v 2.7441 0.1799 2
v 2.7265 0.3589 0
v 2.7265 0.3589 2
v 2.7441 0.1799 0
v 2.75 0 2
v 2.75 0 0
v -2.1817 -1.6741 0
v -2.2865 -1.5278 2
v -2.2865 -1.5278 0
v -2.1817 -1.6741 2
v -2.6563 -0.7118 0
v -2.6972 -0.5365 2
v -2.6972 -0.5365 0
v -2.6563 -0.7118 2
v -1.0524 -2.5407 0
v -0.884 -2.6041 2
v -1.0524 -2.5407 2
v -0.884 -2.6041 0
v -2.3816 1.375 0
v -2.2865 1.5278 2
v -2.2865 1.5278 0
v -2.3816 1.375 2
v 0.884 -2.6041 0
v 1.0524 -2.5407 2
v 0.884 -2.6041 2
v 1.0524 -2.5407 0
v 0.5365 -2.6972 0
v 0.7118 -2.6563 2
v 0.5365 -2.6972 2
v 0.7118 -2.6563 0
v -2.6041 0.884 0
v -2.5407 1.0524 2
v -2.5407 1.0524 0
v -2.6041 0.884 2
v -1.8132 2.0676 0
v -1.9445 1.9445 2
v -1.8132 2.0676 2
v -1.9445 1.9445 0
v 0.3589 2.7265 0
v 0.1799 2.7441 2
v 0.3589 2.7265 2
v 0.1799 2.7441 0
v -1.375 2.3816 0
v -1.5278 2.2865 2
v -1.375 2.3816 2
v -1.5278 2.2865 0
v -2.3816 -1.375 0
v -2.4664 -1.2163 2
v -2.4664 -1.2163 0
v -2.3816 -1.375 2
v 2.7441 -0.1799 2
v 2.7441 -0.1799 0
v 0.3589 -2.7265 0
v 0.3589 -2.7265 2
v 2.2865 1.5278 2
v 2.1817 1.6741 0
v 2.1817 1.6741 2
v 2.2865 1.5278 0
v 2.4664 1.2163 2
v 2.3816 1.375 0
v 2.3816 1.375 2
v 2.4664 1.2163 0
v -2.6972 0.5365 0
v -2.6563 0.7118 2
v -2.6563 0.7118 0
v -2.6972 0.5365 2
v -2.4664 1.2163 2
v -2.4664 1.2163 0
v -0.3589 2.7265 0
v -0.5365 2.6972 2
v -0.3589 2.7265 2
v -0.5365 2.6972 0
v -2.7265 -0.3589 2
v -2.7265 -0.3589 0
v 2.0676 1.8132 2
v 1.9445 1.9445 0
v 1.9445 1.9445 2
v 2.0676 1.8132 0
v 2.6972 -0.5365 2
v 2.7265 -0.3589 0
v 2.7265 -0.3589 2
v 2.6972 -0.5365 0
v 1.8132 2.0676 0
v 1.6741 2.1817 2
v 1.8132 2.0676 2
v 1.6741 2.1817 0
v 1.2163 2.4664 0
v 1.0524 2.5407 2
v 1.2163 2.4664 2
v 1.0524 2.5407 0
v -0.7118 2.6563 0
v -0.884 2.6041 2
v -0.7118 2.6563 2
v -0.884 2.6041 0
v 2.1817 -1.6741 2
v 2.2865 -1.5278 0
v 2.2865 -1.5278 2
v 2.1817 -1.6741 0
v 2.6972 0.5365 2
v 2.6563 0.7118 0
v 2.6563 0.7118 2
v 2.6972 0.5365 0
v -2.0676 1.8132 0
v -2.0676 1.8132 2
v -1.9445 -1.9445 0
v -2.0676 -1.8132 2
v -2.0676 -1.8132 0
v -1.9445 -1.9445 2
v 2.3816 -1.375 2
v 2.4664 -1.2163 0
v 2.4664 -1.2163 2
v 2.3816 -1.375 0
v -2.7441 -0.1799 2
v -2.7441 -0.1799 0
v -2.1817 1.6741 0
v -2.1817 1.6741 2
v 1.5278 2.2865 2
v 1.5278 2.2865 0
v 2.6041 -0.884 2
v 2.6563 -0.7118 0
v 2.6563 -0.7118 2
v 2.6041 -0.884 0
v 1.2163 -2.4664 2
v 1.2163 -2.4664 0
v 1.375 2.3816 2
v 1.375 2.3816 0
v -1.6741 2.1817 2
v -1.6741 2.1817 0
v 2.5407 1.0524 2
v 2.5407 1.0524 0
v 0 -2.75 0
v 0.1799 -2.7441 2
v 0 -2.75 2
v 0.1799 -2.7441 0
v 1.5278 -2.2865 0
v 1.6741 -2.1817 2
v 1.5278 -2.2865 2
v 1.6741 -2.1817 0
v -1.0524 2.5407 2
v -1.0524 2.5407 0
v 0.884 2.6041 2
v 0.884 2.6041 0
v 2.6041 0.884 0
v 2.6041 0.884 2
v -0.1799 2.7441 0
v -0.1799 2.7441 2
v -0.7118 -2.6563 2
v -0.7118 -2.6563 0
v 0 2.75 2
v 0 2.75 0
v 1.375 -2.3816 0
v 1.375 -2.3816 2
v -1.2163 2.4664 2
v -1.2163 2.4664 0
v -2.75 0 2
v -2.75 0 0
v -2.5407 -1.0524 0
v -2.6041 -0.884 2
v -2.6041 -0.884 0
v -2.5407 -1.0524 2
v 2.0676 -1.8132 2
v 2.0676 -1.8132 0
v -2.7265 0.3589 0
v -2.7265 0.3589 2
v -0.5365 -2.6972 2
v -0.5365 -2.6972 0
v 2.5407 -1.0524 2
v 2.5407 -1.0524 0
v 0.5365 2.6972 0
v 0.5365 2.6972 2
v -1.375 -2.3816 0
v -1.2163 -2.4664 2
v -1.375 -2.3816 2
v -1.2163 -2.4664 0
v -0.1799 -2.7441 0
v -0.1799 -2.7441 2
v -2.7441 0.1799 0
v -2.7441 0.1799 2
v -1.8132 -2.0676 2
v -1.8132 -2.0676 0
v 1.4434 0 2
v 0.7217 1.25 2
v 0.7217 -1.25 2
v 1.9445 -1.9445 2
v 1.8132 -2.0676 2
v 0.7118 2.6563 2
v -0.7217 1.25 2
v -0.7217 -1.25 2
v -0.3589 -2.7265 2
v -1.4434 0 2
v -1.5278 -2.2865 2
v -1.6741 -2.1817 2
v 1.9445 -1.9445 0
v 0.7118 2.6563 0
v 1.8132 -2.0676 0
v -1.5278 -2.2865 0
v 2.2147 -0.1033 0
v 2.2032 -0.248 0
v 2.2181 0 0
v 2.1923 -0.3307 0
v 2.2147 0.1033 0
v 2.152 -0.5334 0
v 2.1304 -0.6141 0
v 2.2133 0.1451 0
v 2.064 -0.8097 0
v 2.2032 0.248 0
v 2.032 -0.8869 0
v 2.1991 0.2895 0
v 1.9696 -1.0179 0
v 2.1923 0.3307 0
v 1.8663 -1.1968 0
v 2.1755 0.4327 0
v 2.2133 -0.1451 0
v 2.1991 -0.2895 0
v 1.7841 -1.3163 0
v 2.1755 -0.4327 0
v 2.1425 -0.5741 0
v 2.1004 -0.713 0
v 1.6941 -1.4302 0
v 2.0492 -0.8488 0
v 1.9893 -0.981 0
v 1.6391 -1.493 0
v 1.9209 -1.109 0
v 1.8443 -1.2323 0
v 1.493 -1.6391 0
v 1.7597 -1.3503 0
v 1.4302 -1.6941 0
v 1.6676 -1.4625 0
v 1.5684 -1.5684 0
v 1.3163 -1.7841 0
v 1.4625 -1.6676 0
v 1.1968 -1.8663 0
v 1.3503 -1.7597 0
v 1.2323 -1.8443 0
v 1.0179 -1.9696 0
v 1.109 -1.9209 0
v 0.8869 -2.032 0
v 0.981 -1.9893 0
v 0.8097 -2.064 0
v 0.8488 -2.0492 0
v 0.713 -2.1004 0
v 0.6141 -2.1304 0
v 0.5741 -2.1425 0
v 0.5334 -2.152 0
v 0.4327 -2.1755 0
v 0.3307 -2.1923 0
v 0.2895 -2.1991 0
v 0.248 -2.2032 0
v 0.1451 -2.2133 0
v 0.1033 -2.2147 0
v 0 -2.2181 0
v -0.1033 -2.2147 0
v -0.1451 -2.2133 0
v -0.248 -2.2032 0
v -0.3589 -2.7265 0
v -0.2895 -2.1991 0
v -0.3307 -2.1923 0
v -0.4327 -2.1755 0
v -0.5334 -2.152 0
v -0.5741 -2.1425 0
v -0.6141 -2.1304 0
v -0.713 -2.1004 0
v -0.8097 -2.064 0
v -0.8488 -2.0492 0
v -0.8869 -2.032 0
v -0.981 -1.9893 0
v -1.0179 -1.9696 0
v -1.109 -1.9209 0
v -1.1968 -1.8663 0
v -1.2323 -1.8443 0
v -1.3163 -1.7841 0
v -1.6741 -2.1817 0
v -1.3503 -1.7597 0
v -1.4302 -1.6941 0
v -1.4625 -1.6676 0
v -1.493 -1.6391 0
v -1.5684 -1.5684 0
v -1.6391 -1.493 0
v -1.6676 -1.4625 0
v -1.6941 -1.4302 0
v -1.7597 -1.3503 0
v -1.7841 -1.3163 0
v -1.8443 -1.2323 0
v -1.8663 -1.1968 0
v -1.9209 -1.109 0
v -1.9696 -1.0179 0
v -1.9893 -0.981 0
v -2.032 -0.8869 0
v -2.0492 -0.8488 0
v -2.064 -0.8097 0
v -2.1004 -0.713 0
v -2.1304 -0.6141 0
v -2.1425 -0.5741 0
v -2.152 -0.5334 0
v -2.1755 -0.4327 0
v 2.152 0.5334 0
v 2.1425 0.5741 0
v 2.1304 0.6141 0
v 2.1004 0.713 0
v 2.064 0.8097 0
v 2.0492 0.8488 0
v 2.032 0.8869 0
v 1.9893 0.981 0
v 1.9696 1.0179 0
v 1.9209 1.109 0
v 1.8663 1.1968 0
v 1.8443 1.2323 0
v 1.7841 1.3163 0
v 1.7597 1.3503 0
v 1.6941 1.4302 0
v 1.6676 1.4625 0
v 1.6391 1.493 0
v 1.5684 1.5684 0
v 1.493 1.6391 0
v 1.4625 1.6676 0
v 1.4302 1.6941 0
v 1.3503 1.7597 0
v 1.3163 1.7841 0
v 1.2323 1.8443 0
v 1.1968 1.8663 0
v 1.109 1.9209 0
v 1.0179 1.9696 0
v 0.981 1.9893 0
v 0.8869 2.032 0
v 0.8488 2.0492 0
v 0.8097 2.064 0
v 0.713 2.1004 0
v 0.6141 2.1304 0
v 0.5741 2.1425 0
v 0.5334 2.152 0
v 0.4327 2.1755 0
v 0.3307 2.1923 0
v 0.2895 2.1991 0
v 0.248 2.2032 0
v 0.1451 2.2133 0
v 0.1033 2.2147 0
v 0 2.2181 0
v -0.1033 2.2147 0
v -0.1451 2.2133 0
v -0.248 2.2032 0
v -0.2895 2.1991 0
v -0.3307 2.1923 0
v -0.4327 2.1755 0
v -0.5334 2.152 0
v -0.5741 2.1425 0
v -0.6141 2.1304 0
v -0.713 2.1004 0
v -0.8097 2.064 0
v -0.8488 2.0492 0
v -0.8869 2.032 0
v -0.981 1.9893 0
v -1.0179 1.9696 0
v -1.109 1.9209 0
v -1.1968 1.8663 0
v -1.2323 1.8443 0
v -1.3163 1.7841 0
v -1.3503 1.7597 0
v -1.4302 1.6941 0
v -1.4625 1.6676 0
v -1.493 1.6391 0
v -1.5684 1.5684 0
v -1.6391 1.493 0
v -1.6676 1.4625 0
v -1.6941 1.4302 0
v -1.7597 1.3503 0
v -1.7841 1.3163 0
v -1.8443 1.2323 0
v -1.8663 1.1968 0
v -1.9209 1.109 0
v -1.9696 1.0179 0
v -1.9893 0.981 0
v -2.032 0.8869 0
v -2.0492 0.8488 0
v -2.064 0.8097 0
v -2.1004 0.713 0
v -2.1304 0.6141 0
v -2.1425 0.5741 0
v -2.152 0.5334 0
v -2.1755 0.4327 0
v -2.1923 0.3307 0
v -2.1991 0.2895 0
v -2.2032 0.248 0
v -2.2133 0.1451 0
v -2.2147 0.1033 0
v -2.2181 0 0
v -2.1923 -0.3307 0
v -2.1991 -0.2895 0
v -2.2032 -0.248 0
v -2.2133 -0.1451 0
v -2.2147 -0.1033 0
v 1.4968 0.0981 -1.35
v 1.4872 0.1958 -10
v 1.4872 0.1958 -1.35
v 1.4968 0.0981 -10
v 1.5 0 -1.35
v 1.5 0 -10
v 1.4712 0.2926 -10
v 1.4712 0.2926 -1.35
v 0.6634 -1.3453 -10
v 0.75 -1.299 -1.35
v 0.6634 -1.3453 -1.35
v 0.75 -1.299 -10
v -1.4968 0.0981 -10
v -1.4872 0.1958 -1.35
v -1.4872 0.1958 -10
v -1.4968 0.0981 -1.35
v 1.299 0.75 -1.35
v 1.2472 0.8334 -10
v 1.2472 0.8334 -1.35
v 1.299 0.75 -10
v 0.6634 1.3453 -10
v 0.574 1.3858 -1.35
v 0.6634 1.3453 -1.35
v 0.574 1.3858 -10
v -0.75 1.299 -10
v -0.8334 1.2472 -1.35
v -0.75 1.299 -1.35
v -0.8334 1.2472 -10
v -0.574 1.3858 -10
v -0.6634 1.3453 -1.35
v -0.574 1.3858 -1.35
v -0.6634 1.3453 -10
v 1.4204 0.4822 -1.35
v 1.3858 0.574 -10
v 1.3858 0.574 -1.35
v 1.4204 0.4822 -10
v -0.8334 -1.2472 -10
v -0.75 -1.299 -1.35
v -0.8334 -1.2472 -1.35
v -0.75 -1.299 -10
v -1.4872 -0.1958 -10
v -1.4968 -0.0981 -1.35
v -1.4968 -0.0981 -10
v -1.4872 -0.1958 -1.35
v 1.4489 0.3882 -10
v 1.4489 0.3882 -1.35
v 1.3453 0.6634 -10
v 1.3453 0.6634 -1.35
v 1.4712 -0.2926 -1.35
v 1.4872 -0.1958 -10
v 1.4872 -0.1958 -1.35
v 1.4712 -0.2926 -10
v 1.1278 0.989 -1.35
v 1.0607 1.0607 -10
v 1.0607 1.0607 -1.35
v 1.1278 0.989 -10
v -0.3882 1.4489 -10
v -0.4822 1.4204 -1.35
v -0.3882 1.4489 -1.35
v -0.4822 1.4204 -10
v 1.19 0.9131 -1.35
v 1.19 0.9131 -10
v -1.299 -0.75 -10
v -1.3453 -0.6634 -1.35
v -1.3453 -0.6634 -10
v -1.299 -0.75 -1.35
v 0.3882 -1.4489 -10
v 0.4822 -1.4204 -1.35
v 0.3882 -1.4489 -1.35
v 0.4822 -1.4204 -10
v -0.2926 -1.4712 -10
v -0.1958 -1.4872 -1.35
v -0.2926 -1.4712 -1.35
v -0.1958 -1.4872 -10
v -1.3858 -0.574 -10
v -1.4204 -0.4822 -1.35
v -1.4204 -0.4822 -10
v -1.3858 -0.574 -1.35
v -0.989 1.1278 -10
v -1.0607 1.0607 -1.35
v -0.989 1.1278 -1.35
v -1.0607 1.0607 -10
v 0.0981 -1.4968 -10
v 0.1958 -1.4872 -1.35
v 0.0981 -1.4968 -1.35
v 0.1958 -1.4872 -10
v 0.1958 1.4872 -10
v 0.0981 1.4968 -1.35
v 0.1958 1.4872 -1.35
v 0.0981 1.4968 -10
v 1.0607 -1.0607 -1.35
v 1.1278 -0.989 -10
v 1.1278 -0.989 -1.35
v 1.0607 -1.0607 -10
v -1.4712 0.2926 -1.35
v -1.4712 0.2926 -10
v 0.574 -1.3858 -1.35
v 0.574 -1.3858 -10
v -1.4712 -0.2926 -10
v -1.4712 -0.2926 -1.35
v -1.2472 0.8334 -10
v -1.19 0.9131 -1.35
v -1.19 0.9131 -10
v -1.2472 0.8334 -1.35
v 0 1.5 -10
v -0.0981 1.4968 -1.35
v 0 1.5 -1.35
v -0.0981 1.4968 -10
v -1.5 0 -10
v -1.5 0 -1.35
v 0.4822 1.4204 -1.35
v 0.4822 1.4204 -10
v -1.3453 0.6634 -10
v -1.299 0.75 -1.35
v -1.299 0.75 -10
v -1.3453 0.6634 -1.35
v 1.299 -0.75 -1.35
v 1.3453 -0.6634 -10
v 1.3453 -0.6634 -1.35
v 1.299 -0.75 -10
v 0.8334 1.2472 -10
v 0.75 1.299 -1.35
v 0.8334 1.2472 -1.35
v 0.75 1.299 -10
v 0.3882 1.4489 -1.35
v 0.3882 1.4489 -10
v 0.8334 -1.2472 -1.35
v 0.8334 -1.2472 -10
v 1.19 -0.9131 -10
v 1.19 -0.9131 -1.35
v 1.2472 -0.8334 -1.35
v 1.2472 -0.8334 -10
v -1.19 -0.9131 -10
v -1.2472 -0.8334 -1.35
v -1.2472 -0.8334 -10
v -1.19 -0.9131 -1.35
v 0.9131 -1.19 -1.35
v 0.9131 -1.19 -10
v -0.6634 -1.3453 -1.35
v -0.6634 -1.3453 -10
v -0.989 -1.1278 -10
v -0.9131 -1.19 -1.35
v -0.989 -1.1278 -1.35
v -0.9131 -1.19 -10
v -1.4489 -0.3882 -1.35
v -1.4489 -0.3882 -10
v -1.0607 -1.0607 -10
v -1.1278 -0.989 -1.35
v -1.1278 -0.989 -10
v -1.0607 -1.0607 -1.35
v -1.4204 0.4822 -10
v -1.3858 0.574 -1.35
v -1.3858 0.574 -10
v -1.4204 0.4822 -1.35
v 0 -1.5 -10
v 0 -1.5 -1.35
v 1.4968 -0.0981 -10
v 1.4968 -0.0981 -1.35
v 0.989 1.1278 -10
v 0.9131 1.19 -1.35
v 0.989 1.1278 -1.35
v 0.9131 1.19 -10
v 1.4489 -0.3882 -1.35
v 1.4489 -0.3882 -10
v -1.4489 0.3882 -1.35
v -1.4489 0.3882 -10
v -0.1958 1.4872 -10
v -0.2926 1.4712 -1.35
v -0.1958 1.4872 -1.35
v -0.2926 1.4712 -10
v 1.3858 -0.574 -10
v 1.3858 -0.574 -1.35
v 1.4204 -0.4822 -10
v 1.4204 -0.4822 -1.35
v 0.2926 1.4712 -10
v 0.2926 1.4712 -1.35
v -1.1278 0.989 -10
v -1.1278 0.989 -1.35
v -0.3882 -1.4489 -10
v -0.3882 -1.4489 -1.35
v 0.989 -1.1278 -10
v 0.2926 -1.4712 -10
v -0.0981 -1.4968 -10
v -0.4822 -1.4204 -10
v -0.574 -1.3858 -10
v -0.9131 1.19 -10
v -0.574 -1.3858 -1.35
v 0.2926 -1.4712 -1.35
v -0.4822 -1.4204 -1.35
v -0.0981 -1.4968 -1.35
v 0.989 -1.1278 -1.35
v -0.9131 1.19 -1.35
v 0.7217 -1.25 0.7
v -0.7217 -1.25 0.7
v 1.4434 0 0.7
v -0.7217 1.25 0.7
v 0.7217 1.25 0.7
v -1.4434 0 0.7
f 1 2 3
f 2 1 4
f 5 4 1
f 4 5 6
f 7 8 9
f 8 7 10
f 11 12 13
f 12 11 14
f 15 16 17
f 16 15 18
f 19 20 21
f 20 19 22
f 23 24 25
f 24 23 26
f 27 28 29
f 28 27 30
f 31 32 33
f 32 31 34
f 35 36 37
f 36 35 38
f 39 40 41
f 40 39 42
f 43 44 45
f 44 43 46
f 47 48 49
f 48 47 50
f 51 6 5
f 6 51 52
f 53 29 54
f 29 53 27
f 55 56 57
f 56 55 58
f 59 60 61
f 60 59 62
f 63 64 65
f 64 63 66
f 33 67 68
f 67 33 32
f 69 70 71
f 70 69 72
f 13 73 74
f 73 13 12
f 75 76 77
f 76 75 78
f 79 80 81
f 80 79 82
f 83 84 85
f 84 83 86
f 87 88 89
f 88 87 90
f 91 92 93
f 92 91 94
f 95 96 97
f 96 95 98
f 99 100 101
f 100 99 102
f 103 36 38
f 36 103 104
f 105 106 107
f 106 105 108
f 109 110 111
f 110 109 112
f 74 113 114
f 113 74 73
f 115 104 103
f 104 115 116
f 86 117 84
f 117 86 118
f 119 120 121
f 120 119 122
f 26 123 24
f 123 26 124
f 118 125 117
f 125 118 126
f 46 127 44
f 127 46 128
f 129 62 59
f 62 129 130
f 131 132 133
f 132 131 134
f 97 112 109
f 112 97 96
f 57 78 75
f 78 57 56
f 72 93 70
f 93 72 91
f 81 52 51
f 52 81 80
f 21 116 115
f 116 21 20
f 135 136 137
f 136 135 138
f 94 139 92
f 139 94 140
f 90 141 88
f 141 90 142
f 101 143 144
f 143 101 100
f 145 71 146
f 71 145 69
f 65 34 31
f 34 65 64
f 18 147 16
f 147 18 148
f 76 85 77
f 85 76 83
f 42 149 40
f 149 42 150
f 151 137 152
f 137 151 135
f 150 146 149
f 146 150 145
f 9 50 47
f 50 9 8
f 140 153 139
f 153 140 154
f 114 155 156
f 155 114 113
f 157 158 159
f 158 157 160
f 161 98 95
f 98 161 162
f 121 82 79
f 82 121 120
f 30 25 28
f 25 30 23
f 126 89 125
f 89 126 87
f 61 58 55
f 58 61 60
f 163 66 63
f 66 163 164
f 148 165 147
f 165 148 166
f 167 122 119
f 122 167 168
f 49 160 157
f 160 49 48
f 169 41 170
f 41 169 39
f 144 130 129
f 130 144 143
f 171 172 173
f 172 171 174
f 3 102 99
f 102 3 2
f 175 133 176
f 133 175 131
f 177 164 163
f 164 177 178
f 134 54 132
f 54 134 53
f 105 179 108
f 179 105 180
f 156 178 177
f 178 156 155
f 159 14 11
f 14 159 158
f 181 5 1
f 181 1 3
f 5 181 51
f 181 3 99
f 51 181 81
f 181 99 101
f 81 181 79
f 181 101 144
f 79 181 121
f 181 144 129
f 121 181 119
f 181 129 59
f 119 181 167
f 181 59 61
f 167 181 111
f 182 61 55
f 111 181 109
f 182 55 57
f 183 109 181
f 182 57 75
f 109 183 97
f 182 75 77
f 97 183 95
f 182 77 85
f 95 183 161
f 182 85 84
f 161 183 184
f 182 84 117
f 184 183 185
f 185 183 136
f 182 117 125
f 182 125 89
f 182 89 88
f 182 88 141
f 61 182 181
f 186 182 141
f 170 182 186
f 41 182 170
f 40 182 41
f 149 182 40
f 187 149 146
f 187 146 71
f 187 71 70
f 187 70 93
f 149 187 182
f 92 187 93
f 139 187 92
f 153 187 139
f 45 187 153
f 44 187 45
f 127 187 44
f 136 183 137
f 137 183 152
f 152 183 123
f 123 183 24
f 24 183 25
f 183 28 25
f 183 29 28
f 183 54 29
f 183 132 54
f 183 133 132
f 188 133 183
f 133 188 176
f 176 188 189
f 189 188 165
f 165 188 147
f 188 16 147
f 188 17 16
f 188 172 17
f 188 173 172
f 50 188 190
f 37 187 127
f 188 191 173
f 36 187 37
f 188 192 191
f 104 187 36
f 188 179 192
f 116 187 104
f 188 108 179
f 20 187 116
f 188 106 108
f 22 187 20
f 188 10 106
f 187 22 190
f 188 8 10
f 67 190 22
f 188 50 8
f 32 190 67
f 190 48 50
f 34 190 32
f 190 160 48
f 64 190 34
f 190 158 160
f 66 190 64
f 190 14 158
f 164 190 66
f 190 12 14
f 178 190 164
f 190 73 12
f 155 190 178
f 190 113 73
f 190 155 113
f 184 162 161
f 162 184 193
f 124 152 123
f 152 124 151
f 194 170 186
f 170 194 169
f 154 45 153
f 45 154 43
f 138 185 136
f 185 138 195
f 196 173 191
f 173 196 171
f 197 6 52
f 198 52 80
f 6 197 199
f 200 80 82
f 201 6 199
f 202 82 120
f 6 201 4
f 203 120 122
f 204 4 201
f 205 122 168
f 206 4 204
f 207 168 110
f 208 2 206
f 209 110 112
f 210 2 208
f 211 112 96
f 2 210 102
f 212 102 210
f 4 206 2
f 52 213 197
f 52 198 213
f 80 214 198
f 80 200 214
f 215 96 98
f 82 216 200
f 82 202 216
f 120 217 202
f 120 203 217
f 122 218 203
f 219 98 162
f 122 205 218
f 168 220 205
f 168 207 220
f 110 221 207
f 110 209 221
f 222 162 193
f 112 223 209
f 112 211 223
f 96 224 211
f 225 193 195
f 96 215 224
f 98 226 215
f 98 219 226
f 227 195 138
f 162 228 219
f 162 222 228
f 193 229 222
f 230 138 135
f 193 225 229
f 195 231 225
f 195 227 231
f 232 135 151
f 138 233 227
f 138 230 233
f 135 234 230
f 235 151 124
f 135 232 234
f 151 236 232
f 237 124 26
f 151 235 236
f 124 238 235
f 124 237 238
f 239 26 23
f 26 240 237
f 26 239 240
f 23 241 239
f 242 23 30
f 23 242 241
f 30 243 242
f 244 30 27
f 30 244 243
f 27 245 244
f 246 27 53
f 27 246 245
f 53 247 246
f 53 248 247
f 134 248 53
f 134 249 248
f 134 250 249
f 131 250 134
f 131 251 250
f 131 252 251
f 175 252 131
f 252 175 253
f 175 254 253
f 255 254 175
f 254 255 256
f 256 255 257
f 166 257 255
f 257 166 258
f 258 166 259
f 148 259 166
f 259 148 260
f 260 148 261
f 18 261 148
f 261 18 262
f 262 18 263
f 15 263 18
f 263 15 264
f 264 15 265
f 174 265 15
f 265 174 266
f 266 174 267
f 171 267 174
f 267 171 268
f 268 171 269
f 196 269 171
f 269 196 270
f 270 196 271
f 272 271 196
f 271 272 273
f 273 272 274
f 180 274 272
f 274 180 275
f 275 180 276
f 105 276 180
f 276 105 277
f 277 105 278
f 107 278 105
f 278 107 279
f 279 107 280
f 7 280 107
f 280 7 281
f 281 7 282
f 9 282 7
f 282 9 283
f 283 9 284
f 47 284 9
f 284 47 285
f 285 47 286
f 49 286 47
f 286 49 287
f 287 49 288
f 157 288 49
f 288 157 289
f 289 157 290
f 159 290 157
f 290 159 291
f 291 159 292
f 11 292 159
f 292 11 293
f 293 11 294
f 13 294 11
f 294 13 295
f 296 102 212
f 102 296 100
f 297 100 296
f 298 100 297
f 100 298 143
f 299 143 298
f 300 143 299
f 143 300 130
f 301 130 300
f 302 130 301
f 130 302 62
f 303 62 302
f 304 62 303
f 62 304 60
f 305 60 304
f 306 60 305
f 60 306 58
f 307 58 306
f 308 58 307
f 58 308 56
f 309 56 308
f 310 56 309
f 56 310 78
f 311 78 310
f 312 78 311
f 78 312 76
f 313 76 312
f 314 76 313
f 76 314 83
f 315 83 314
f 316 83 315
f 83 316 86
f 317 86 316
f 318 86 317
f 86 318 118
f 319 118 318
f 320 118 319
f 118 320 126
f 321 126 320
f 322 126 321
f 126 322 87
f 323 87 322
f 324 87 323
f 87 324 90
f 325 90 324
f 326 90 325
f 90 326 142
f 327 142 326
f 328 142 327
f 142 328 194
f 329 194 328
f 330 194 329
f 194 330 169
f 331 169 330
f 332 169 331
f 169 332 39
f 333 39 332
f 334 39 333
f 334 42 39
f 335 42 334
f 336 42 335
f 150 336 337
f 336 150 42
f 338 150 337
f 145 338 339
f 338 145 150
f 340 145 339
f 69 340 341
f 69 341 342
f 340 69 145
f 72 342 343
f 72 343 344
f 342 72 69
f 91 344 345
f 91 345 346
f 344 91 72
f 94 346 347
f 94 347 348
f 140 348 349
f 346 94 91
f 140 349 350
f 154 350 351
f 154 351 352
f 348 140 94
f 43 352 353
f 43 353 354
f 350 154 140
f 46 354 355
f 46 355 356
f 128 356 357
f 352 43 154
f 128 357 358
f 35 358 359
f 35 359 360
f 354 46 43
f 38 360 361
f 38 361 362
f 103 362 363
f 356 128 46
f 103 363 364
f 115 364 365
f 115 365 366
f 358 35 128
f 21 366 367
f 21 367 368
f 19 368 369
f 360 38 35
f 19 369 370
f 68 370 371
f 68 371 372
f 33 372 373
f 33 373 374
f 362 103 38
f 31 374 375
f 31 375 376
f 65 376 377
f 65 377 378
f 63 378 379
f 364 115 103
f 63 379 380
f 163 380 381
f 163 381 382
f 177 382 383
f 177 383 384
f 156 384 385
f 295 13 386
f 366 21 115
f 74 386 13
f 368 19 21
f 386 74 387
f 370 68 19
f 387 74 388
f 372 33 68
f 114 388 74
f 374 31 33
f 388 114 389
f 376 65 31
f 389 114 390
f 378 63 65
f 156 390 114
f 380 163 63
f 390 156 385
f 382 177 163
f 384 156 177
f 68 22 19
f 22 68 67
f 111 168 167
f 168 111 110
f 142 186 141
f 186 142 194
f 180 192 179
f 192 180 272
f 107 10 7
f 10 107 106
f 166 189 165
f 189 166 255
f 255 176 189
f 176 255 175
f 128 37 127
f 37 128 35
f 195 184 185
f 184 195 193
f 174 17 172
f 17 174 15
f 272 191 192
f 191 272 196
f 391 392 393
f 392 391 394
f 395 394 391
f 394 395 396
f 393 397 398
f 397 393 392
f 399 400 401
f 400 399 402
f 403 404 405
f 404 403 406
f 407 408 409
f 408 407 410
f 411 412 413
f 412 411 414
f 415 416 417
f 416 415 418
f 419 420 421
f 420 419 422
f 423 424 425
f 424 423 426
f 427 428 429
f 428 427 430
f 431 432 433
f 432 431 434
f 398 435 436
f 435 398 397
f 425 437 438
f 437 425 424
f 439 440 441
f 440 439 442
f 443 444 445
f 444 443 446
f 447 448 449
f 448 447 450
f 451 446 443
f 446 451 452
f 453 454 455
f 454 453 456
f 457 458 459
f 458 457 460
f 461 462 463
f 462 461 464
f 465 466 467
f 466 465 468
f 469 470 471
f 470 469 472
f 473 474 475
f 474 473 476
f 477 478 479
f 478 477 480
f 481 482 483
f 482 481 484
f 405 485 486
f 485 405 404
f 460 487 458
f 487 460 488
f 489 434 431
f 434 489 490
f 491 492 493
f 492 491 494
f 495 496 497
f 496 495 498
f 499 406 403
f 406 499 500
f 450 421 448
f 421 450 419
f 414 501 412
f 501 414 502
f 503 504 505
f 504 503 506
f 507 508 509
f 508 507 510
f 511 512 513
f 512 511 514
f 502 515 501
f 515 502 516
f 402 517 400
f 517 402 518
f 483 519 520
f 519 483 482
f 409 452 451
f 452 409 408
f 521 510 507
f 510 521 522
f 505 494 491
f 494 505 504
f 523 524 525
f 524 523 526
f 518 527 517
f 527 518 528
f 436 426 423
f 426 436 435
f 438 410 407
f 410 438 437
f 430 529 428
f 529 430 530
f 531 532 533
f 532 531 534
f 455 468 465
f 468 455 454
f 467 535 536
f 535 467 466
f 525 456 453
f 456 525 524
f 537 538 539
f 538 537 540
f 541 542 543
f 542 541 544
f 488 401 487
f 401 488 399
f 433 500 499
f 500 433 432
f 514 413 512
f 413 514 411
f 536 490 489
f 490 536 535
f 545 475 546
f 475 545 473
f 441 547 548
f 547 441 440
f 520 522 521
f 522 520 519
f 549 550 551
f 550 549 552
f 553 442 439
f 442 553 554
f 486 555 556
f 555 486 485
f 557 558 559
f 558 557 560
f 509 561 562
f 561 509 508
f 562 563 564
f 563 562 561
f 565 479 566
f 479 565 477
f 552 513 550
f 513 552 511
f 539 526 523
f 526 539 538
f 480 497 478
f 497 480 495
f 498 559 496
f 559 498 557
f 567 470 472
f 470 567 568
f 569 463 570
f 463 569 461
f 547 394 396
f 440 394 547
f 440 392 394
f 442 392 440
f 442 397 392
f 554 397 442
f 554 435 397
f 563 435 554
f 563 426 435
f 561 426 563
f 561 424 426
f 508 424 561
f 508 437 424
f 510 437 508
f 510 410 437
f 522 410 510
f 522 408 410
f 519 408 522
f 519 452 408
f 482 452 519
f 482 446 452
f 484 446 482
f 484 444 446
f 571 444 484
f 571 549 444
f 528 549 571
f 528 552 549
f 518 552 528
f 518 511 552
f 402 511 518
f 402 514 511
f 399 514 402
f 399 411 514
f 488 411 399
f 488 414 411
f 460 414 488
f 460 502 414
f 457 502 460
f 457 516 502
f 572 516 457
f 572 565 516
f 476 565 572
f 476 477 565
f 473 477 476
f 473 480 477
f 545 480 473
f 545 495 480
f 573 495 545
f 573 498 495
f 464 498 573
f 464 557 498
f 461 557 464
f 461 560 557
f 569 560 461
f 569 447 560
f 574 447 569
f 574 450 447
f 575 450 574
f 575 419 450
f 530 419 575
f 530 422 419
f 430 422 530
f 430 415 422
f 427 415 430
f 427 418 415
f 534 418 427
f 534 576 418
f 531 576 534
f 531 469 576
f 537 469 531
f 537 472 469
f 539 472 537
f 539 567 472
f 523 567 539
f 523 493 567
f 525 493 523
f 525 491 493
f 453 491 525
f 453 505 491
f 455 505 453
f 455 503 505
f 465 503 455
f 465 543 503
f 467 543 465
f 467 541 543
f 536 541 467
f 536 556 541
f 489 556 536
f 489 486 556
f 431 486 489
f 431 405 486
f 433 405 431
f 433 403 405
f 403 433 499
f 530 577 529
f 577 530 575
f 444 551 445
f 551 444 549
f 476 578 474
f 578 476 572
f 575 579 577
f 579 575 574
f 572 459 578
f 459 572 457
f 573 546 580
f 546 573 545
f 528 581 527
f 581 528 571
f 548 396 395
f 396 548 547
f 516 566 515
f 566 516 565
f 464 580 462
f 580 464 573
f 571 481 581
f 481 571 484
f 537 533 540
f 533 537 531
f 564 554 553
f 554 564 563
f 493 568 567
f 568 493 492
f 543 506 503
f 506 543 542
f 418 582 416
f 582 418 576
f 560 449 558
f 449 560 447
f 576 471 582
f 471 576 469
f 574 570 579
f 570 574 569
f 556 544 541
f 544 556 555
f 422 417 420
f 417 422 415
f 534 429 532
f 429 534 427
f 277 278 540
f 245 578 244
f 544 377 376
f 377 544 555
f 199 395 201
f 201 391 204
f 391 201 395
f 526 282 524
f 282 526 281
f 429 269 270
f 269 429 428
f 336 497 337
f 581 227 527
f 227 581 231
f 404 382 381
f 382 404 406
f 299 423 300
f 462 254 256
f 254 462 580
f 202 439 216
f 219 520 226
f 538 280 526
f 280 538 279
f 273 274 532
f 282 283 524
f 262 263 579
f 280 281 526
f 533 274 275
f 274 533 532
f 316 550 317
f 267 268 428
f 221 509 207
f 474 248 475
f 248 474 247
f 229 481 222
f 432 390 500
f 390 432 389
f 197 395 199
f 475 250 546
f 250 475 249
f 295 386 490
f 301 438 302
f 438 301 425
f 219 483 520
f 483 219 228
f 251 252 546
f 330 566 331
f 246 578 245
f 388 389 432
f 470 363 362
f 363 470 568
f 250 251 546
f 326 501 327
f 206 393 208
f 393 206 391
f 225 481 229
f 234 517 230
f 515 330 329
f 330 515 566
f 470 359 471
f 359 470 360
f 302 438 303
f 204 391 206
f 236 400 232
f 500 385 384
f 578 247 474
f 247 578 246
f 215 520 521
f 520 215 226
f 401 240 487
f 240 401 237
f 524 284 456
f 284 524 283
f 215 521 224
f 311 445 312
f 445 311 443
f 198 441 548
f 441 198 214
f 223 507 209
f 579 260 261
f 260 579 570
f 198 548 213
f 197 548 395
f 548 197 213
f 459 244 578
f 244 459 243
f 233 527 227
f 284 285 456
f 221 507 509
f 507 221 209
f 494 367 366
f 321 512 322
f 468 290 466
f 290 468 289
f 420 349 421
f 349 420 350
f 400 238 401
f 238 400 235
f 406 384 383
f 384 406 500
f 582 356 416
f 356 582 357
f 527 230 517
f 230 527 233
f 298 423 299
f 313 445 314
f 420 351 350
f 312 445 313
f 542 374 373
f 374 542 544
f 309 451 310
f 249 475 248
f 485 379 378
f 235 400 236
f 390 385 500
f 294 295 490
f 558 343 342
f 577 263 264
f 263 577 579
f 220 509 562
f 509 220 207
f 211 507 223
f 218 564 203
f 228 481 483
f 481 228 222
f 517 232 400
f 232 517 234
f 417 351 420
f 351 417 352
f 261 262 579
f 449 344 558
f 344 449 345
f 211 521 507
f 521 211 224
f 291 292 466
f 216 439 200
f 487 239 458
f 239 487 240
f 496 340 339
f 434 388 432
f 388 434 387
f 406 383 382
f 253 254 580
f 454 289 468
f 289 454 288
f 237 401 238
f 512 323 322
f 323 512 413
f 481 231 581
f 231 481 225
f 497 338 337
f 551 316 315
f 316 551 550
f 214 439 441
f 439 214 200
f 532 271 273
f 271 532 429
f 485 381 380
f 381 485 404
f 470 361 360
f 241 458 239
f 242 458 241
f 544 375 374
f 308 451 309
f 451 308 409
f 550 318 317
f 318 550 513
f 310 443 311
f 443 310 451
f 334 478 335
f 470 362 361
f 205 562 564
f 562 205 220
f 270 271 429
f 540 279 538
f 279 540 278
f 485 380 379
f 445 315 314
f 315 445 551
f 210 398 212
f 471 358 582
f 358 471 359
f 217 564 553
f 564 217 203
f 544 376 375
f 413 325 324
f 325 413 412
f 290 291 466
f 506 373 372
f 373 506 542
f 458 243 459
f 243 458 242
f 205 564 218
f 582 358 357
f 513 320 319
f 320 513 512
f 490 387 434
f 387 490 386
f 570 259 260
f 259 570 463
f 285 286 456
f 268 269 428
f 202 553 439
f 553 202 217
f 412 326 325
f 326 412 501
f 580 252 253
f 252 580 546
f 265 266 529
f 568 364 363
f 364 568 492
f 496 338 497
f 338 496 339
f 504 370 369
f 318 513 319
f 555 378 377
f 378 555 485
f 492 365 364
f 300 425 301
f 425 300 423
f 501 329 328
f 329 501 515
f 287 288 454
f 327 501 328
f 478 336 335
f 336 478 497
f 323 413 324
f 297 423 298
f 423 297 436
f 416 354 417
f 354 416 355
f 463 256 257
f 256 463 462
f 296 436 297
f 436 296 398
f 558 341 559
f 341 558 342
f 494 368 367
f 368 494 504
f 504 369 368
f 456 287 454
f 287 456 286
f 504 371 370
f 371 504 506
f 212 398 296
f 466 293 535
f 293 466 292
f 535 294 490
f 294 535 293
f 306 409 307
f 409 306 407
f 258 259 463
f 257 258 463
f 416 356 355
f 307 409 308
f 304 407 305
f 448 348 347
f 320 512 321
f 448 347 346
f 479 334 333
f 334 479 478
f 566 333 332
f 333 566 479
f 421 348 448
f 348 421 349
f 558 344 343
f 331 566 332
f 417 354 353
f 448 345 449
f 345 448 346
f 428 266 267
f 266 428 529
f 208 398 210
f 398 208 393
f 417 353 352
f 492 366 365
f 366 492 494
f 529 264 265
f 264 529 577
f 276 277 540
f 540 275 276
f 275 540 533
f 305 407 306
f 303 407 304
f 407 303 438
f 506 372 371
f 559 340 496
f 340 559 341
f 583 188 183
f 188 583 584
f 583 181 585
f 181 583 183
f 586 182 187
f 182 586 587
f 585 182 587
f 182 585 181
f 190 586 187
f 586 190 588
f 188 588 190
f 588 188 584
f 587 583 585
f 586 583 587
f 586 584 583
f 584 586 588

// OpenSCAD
// Socket head cap screw (single connected solid)
// Requested: 3.0mm shank dia, 5.5mm head dia, 2.0mm head height, 10mm long

$fn = 96;

// Parameters (mm)
thread_major_diameter_mm = 3.0;
overall_length_mm        = 10.0;   // under-head length
head_diameter_mm         = 5.5;
head_height_mm           = 2.0;

// Socket (typical for M3 SHCS; adjustable)
socket_across_flats_mm   = 2.5;
socket_depth_mm          = 1.3;

// Small edge details
under_head_chamfer_h_mm  = 0.35;
tip_chamfer_h_mm         = 0.6;

// Structural overlap to guarantee connection (1–2mm as required)
overlap_mm               = 1.0;

module socket_head_cap_screw() {
    shank_r = thread_major_diameter_mm/2;
    head_r  = head_diameter_mm/2;

    // z=0 at underside of head; shank extends to negative z; head extends to positive z.
    difference() {
        union() {
            // Head: z = 0 .. +head_height
            translate([0,0, head_height_mm/2])
                cylinder(h=head_height_mm, r=head_r, center=true);

            // Shank: z = -overall_length .. +overlap (overlaps into head)
            translate([0,0, (-overall_length_mm + overlap_mm)/2])
                cylinder(h=overall_length_mm + overlap_mm, r=shank_r, center=true);

            // Under-head frustum/collar (FIXED): explicitly spans across z=0 and overlaps
            // Bottom at z = -(under_head_chamfer_h + overlap), top at z = +overlap
            // This guarantees it is fused to BOTH shank and head (no floating/disconnected collar).
            translate([0,0, (-under_head_chamfer_h_mm)/2])
                cylinder(h=under_head_chamfer_h_mm + 2*overlap_mm,
                         r1=shank_r,
                         r2=head_r,
                         center=true);

            // Tip chamfer: overlaps into shank by overlap_mm to avoid any seam
            // Tip region near z = -overall_length
            translate([0,0, -overall_length_mm + tip_chamfer_h_mm/2 + overlap_mm/2])
                cylinder(h=tip_chamfer_h_mm + overlap_mm,
                         r1=shank_r,
                         r2=max(shank_r - tip_chamfer_h_mm, shank_r*0.2),
                         center=true);
        }

        // Hex socket recess (cut into head from top), with slight extra depth to avoid coplanar artifacts
        socket_r = socket_across_flats_mm/(2*cos(30)); // across flats -> circumscribed radius
        translate([0,0, head_height_mm - socket_depth_mm/2 + 0.2])
            cylinder(h=socket_depth_mm + 0.4,
                     r=socket_r,
                     $fn=6,
                     center=true);
    }
}

socket_head_cap_screw();
